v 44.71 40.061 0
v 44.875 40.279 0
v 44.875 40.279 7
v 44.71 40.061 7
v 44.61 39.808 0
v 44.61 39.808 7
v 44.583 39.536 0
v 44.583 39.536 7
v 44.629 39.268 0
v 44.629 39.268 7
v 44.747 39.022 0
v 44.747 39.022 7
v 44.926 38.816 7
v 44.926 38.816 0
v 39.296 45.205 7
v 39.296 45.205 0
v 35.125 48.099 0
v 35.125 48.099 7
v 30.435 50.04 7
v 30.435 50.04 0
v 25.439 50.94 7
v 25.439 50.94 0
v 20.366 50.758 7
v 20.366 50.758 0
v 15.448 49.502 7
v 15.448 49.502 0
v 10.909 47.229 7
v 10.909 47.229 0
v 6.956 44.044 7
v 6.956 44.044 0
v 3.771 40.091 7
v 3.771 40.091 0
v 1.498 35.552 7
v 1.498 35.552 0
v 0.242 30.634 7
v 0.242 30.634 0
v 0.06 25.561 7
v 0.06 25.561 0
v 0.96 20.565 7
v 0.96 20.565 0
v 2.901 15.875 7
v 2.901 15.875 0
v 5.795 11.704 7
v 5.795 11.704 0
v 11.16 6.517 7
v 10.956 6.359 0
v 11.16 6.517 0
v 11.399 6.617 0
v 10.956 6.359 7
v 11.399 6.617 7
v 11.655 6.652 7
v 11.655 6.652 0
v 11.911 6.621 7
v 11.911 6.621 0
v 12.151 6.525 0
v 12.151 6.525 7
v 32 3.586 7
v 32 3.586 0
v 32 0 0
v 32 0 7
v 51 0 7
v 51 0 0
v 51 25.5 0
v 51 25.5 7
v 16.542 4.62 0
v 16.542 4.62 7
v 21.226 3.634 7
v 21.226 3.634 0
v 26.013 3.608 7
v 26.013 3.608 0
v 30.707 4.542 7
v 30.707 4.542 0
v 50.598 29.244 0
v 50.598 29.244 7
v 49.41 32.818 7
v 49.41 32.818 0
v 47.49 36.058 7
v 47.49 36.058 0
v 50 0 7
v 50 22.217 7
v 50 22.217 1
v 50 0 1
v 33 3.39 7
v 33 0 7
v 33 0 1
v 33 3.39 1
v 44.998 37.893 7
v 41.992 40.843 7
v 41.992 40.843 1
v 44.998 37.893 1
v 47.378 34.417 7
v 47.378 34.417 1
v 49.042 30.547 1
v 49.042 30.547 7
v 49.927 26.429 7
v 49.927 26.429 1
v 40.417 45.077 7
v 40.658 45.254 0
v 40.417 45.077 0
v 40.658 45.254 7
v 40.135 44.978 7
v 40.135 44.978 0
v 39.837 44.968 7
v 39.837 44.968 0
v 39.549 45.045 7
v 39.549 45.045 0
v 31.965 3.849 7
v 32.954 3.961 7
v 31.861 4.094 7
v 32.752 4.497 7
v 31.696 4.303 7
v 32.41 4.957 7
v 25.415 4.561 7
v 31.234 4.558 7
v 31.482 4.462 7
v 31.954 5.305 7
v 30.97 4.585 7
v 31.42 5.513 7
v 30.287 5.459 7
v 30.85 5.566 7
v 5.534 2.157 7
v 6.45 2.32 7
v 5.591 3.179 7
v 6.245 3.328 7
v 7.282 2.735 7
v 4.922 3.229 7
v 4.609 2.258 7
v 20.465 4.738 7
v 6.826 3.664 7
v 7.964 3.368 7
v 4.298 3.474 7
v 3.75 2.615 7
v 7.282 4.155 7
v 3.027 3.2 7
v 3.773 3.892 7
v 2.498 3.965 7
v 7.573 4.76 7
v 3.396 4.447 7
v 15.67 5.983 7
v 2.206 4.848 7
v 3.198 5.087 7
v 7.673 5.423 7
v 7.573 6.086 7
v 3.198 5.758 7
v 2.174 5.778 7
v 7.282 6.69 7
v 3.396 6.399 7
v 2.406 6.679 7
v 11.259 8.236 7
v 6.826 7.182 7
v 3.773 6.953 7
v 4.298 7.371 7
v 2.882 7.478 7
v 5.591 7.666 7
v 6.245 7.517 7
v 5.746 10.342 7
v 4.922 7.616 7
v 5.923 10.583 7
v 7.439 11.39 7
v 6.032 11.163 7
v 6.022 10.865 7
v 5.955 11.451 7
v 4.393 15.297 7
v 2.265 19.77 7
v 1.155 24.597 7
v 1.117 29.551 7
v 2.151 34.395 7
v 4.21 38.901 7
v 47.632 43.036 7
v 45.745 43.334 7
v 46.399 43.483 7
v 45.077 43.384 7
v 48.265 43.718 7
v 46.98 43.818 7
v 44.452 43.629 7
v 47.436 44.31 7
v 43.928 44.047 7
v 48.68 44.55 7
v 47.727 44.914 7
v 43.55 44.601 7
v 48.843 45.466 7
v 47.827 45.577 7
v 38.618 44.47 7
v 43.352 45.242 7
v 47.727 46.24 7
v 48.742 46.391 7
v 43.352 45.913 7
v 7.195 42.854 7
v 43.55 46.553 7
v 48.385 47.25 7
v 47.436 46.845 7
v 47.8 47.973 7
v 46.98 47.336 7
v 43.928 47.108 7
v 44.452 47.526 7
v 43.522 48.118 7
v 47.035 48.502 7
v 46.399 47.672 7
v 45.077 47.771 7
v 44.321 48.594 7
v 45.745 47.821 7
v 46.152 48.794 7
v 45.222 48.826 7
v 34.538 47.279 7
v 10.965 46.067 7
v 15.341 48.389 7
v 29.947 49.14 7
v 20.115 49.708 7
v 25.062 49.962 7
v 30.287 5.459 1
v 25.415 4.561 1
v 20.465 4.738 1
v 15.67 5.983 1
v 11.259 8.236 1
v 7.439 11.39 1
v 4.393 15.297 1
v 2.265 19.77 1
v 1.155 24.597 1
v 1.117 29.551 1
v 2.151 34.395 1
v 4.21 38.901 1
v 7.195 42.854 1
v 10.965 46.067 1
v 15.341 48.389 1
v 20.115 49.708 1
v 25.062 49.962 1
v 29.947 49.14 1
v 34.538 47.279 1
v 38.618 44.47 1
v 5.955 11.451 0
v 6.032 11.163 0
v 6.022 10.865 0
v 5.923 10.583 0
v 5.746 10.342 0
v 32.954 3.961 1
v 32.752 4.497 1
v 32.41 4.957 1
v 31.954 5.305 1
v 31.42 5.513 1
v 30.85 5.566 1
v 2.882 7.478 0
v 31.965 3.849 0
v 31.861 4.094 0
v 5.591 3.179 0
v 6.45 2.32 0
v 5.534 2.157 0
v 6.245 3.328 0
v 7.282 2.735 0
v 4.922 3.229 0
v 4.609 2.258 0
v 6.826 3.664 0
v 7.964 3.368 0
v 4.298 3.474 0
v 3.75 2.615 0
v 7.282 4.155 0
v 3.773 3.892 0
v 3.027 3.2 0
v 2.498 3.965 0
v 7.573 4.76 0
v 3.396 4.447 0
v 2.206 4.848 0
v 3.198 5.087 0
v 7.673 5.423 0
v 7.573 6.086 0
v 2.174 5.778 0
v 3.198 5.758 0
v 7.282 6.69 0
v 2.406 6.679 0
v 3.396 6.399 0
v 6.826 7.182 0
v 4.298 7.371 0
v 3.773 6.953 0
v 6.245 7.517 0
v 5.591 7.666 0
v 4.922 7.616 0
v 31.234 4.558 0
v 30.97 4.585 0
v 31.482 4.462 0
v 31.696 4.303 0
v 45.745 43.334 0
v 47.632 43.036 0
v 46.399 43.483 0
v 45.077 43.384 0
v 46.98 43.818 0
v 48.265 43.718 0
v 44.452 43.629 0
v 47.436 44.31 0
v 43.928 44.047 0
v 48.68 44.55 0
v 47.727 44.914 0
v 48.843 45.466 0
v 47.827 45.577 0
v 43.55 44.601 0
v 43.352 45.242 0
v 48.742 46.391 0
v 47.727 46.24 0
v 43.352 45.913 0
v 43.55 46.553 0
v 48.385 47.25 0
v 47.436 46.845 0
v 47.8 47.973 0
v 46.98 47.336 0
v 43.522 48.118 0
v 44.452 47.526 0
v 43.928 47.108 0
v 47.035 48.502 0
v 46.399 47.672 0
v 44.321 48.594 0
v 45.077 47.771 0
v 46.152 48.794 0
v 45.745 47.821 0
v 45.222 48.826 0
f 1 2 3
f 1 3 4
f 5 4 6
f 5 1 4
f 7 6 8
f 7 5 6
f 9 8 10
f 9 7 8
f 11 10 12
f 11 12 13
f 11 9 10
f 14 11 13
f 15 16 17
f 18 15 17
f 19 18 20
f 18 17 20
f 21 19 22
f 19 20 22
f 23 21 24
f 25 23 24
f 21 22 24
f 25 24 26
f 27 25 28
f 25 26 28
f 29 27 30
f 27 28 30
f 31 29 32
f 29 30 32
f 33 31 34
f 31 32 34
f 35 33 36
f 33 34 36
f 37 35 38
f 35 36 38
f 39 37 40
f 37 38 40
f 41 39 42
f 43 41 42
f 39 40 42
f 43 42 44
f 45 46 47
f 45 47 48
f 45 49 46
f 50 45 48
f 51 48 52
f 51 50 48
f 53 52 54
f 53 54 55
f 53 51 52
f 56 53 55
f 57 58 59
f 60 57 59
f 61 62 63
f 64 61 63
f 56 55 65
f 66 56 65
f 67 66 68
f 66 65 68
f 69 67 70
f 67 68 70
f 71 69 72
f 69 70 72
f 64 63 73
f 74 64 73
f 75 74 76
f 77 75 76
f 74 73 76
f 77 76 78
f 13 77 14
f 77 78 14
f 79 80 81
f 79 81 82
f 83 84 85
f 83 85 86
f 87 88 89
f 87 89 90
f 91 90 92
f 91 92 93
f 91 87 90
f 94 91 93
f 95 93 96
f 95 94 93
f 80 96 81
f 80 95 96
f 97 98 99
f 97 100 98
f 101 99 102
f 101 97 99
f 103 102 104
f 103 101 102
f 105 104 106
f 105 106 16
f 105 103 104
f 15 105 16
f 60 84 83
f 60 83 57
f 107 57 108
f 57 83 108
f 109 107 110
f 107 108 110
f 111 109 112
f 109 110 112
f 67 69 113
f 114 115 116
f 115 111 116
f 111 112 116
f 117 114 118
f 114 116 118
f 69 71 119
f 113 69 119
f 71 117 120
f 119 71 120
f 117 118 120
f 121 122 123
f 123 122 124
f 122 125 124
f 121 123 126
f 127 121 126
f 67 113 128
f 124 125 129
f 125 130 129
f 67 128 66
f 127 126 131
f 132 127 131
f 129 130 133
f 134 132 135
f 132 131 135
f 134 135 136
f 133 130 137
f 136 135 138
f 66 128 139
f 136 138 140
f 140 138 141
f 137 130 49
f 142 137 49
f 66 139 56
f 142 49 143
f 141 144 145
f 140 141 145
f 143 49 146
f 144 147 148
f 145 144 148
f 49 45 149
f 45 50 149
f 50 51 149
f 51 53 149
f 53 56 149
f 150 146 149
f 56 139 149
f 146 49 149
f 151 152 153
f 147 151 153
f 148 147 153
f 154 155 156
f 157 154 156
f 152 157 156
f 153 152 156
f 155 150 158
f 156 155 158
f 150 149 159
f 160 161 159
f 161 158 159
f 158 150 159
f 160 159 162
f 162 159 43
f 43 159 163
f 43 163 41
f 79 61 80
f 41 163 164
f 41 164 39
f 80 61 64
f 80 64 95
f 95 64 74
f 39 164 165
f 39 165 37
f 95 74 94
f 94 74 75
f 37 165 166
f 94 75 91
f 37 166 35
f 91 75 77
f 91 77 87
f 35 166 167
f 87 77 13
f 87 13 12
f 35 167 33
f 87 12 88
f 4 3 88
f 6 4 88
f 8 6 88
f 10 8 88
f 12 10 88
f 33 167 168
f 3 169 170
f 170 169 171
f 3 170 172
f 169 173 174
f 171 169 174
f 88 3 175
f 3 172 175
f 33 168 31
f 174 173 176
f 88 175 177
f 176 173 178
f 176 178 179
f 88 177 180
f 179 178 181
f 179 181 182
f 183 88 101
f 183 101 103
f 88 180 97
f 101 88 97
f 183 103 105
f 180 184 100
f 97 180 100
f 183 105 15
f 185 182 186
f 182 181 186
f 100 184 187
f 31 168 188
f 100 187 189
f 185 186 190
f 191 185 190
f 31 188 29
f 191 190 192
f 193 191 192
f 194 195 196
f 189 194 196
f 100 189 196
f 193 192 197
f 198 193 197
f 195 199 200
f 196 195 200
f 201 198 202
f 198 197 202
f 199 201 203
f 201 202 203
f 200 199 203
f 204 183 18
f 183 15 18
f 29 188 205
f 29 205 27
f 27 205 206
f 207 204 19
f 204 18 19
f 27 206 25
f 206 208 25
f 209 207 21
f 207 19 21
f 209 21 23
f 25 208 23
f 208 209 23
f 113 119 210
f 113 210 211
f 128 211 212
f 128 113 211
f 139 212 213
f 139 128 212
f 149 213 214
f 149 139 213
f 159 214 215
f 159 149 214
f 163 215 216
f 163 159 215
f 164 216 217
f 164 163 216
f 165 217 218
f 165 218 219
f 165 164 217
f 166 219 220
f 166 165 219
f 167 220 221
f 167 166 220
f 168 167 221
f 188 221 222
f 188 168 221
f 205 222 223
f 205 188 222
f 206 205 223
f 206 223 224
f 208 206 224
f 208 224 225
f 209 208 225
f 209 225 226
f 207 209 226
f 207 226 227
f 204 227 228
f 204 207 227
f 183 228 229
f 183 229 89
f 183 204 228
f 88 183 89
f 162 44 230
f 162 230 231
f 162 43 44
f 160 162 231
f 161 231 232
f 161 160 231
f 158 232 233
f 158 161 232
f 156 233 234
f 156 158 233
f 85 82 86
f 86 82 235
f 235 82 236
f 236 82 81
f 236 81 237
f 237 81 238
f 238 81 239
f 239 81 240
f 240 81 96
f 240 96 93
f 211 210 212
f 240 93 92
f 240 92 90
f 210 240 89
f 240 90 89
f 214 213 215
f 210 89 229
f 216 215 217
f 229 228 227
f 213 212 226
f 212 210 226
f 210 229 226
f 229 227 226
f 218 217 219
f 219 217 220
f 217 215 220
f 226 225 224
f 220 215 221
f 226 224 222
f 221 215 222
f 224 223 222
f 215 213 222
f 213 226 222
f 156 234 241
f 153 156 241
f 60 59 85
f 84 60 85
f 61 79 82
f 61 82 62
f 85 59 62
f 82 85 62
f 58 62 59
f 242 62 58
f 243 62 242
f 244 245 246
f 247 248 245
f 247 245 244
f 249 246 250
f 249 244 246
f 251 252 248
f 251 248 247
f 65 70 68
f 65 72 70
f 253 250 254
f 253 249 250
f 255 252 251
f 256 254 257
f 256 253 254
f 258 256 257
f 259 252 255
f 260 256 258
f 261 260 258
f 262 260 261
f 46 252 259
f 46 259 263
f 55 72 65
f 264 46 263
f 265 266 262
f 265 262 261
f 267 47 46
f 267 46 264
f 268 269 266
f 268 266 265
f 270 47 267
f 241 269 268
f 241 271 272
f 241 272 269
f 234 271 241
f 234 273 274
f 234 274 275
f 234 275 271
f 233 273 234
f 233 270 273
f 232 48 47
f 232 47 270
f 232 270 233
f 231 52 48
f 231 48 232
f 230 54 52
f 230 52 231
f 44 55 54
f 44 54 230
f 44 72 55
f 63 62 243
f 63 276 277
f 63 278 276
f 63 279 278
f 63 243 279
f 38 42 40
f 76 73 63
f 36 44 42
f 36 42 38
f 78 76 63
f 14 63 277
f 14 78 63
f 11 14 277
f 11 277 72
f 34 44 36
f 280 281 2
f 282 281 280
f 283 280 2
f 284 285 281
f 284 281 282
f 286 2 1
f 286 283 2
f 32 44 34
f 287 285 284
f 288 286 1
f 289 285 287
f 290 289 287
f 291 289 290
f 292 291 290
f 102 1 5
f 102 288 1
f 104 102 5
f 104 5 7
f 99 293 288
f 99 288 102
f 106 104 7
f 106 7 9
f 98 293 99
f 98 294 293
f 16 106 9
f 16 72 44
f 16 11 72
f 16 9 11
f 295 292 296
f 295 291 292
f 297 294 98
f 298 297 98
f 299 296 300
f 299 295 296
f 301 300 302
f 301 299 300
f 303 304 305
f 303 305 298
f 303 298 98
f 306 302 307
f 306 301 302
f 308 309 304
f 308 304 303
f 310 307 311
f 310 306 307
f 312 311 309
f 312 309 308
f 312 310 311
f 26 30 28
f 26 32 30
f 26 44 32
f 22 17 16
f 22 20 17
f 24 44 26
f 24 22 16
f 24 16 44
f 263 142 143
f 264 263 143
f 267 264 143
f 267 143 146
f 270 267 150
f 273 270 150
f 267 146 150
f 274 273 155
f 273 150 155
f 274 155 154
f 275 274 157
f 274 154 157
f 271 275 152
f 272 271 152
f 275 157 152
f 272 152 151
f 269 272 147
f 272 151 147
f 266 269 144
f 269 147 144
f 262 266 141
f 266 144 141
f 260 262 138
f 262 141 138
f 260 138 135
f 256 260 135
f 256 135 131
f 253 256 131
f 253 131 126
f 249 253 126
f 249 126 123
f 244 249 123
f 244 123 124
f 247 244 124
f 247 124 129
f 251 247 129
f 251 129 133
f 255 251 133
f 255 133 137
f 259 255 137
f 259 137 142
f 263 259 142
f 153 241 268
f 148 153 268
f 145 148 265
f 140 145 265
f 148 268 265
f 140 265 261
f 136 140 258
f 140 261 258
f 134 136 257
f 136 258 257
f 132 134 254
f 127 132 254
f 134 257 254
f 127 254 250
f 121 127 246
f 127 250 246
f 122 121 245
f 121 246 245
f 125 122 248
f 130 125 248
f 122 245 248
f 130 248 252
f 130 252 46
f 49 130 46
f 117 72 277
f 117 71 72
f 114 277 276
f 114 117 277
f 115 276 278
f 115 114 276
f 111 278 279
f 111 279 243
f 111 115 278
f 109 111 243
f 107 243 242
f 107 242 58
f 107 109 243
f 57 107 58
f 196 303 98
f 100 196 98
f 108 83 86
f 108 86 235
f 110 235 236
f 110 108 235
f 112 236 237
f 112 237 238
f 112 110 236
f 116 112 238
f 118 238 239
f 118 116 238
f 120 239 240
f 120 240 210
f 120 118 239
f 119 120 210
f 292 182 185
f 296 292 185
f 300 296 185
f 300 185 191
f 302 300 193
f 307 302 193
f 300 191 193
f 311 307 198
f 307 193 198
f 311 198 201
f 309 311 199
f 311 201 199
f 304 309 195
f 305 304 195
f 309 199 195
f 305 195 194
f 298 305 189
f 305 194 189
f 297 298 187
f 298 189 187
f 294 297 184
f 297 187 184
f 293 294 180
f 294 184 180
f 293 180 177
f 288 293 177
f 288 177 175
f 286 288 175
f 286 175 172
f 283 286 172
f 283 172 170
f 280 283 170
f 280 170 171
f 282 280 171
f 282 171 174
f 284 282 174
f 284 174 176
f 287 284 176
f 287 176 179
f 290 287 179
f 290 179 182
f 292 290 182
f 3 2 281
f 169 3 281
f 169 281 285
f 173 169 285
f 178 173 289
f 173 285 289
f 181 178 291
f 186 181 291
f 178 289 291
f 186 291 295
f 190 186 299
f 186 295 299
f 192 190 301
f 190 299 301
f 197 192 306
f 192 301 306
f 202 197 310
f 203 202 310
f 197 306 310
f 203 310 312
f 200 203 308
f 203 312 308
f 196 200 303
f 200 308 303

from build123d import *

# Parameters (mm, degrees)
BOSS_EXTRUDE1_DEPTH   = 7
FILLET1_R             = 1
FILLET2_R             = 1
FILLET3_R             = 1
CUT_EXTRUDE1_DEPTH    = 6
F_4_0MM_DOWEL_HOLE1_D = 4.5


with BuildPart() as part:
    # Sketch1 → Boss-Extrude1 (new body)
    with BuildSketch(Plane.XY):
        with BuildLine():
            Line((51, 0), (51, 25.5))
            ThreePointArc((51, 25.5), (49.182412553, 33.297587625), (44.104318796, 39.487818693))
            ThreePointArc((44.104318796, 39.487818693), (44.100505812, 39.494158329), (44.096690854, 39.500496777))
            Line((44.096690854, 39.500496777), (47.63222476, 43.036030683))
            ThreePointArc((47.63222476, 43.036030683), (48.118470522, 47.63222476), (43.522276444, 48.118470522))
            Line((43.522276444, 48.118470522), (39.986742538, 44.582936616))
            ThreePointArc((39.986742538, 44.582936616), (6.956213947, 44.043786053), (6.417063384, 11.013257462))
            Line((6.417063384, 11.013257462), (2.881529478, 7.477723556))
            ThreePointArc((2.881529478, 7.477723556), (3.36777524, 2.881529478), (7.963969317, 3.36777524))
            Line((7.963969317, 3.36777524), (11.499503223, 6.903309146))
            ThreePointArc((11.499503223, 6.903309146), (21.530362571, 3.603949385), (32, 4.978942549))
            Line((32, 4.978942549), (32, 0))
            Line((32, 0), (51, 0))
        make_face()
    extrude(amount=BOSS_EXTRUDE1_DEPTH)

    # Fillet1
    # the kernel refuses this fillet: 1 mm, written as the material it adds along each edge
    with BuildSketch(Plane(origin=(44.096690854, 39.500496777, 0), x_dir=(0.7715576110634285, -0.6361594554905989, 0), z_dir=(0, 0, 1))) as fillet1_piece_1:
        with BuildLine():
            CenterArc((1.100766551, 0.999676081), FILLET1_R, 174.506032256, 94.03559873)
            Line((0.105360267, 1.095417035), (0.005819639, 1.104991131))
            Line((0.005819639, 1.104991131), (-0.099540628, 0.009574095))
            Line((-0.099540628, 0.009574095), (-0.033285789, -0.0942977))
            ThreePointArc((-0.033285789, -0.0942977), (0.017424165, -0.104868941), (1.072770899, -0.099967608))
            Line((1.072770899, -0.099967608), (1.075315958, 0))
        make_face()
    extrude(amount=7)
    with BuildSketch(Plane(origin=(44.104318796, 39.487818693, 0), x_dir=(0.7745037653558564, -0.6325692985354254, 0), z_dir=(0, 0, 1))) as fillet1_piece_2:
        with BuildLine():
            CenterArc((1.091469777, 0.999547102), FILLET1_R, 174.23993613, 94.03559873)
            Line((0.096518871, 1.099909926), (-0.002976219, 1.109946208))
            ThreePointArc((-0.002976219, 1.109946208), (-0.113422726, 0.015030304), (-0.033782013, -0.094121069))
            Line((-0.033782013, -0.094121069), (0.003009305, -0.09995471))
            ThreePointArc((0.003009305, -0.09995471), (0.530688363, -0.092013175), (1.058367421, -0.09995471))
            Line((1.058367421, -0.09995471), (1.061376726, 0))
        make_face()
    extrude(amount=7)

    # Fillet2
    fillet2_edges = [part.edges().sort_by_distance(p)[0] for p in [
        (11.499503223, 6.903309146, 3.5),
        (6.417063384, 11.013257462, 3.5),
        (39.986742538, 44.582936616, 3.5),
    ]]
    fillet(fillet2_edges, radius=FILLET2_R)

    # Fillet3
    fillet3_edges = [part.edges().sort_by_distance(p)[0] for p in [
        (32, 4.978942549, 3.5),
    ]]
    fillet(fillet3_edges, radius=FILLET3_R)

    # Sketch2 → Cut-Extrude1 (cut)
    with BuildSketch(Plane.XY.offset(7)):
        with BuildLine():
            Line((33, 0), (33, 3.389836053))
            ThreePointArc((33, 3.389836053), (32.194148238, 5.146743671), (30.28668256, 5.459307466))
            ThreePointArc((30.28668256, 5.459307466), (2.151192178, 34.39520823), (41.992282379, 40.84344083))
            ThreePointArc((41.992282379, 40.84344083), (48.304075384, 32.522702207), (50, 22.217496636))
            Line((50, 22.217496636), (50, 0))
            Line((50, 0), (33, 0))
        make_face()
    extrude(amount=-CUT_EXTRUDE1_DEPTH, mode=Mode.SUBTRACT)

    # Ø4.0mm Dowel Hole1 (through all)
    with Locations(Plane(origin=(0, 0, 0), x_dir=(-1, 0, 0), z_dir=(0, 0, -1))):
        with Locations((-5.422749398, 5.422749398), (-45.577250602, 45.577250602)):
            Hole(F_4_0MM_DOWEL_HOLE1_D / 2)


solid = part.part
